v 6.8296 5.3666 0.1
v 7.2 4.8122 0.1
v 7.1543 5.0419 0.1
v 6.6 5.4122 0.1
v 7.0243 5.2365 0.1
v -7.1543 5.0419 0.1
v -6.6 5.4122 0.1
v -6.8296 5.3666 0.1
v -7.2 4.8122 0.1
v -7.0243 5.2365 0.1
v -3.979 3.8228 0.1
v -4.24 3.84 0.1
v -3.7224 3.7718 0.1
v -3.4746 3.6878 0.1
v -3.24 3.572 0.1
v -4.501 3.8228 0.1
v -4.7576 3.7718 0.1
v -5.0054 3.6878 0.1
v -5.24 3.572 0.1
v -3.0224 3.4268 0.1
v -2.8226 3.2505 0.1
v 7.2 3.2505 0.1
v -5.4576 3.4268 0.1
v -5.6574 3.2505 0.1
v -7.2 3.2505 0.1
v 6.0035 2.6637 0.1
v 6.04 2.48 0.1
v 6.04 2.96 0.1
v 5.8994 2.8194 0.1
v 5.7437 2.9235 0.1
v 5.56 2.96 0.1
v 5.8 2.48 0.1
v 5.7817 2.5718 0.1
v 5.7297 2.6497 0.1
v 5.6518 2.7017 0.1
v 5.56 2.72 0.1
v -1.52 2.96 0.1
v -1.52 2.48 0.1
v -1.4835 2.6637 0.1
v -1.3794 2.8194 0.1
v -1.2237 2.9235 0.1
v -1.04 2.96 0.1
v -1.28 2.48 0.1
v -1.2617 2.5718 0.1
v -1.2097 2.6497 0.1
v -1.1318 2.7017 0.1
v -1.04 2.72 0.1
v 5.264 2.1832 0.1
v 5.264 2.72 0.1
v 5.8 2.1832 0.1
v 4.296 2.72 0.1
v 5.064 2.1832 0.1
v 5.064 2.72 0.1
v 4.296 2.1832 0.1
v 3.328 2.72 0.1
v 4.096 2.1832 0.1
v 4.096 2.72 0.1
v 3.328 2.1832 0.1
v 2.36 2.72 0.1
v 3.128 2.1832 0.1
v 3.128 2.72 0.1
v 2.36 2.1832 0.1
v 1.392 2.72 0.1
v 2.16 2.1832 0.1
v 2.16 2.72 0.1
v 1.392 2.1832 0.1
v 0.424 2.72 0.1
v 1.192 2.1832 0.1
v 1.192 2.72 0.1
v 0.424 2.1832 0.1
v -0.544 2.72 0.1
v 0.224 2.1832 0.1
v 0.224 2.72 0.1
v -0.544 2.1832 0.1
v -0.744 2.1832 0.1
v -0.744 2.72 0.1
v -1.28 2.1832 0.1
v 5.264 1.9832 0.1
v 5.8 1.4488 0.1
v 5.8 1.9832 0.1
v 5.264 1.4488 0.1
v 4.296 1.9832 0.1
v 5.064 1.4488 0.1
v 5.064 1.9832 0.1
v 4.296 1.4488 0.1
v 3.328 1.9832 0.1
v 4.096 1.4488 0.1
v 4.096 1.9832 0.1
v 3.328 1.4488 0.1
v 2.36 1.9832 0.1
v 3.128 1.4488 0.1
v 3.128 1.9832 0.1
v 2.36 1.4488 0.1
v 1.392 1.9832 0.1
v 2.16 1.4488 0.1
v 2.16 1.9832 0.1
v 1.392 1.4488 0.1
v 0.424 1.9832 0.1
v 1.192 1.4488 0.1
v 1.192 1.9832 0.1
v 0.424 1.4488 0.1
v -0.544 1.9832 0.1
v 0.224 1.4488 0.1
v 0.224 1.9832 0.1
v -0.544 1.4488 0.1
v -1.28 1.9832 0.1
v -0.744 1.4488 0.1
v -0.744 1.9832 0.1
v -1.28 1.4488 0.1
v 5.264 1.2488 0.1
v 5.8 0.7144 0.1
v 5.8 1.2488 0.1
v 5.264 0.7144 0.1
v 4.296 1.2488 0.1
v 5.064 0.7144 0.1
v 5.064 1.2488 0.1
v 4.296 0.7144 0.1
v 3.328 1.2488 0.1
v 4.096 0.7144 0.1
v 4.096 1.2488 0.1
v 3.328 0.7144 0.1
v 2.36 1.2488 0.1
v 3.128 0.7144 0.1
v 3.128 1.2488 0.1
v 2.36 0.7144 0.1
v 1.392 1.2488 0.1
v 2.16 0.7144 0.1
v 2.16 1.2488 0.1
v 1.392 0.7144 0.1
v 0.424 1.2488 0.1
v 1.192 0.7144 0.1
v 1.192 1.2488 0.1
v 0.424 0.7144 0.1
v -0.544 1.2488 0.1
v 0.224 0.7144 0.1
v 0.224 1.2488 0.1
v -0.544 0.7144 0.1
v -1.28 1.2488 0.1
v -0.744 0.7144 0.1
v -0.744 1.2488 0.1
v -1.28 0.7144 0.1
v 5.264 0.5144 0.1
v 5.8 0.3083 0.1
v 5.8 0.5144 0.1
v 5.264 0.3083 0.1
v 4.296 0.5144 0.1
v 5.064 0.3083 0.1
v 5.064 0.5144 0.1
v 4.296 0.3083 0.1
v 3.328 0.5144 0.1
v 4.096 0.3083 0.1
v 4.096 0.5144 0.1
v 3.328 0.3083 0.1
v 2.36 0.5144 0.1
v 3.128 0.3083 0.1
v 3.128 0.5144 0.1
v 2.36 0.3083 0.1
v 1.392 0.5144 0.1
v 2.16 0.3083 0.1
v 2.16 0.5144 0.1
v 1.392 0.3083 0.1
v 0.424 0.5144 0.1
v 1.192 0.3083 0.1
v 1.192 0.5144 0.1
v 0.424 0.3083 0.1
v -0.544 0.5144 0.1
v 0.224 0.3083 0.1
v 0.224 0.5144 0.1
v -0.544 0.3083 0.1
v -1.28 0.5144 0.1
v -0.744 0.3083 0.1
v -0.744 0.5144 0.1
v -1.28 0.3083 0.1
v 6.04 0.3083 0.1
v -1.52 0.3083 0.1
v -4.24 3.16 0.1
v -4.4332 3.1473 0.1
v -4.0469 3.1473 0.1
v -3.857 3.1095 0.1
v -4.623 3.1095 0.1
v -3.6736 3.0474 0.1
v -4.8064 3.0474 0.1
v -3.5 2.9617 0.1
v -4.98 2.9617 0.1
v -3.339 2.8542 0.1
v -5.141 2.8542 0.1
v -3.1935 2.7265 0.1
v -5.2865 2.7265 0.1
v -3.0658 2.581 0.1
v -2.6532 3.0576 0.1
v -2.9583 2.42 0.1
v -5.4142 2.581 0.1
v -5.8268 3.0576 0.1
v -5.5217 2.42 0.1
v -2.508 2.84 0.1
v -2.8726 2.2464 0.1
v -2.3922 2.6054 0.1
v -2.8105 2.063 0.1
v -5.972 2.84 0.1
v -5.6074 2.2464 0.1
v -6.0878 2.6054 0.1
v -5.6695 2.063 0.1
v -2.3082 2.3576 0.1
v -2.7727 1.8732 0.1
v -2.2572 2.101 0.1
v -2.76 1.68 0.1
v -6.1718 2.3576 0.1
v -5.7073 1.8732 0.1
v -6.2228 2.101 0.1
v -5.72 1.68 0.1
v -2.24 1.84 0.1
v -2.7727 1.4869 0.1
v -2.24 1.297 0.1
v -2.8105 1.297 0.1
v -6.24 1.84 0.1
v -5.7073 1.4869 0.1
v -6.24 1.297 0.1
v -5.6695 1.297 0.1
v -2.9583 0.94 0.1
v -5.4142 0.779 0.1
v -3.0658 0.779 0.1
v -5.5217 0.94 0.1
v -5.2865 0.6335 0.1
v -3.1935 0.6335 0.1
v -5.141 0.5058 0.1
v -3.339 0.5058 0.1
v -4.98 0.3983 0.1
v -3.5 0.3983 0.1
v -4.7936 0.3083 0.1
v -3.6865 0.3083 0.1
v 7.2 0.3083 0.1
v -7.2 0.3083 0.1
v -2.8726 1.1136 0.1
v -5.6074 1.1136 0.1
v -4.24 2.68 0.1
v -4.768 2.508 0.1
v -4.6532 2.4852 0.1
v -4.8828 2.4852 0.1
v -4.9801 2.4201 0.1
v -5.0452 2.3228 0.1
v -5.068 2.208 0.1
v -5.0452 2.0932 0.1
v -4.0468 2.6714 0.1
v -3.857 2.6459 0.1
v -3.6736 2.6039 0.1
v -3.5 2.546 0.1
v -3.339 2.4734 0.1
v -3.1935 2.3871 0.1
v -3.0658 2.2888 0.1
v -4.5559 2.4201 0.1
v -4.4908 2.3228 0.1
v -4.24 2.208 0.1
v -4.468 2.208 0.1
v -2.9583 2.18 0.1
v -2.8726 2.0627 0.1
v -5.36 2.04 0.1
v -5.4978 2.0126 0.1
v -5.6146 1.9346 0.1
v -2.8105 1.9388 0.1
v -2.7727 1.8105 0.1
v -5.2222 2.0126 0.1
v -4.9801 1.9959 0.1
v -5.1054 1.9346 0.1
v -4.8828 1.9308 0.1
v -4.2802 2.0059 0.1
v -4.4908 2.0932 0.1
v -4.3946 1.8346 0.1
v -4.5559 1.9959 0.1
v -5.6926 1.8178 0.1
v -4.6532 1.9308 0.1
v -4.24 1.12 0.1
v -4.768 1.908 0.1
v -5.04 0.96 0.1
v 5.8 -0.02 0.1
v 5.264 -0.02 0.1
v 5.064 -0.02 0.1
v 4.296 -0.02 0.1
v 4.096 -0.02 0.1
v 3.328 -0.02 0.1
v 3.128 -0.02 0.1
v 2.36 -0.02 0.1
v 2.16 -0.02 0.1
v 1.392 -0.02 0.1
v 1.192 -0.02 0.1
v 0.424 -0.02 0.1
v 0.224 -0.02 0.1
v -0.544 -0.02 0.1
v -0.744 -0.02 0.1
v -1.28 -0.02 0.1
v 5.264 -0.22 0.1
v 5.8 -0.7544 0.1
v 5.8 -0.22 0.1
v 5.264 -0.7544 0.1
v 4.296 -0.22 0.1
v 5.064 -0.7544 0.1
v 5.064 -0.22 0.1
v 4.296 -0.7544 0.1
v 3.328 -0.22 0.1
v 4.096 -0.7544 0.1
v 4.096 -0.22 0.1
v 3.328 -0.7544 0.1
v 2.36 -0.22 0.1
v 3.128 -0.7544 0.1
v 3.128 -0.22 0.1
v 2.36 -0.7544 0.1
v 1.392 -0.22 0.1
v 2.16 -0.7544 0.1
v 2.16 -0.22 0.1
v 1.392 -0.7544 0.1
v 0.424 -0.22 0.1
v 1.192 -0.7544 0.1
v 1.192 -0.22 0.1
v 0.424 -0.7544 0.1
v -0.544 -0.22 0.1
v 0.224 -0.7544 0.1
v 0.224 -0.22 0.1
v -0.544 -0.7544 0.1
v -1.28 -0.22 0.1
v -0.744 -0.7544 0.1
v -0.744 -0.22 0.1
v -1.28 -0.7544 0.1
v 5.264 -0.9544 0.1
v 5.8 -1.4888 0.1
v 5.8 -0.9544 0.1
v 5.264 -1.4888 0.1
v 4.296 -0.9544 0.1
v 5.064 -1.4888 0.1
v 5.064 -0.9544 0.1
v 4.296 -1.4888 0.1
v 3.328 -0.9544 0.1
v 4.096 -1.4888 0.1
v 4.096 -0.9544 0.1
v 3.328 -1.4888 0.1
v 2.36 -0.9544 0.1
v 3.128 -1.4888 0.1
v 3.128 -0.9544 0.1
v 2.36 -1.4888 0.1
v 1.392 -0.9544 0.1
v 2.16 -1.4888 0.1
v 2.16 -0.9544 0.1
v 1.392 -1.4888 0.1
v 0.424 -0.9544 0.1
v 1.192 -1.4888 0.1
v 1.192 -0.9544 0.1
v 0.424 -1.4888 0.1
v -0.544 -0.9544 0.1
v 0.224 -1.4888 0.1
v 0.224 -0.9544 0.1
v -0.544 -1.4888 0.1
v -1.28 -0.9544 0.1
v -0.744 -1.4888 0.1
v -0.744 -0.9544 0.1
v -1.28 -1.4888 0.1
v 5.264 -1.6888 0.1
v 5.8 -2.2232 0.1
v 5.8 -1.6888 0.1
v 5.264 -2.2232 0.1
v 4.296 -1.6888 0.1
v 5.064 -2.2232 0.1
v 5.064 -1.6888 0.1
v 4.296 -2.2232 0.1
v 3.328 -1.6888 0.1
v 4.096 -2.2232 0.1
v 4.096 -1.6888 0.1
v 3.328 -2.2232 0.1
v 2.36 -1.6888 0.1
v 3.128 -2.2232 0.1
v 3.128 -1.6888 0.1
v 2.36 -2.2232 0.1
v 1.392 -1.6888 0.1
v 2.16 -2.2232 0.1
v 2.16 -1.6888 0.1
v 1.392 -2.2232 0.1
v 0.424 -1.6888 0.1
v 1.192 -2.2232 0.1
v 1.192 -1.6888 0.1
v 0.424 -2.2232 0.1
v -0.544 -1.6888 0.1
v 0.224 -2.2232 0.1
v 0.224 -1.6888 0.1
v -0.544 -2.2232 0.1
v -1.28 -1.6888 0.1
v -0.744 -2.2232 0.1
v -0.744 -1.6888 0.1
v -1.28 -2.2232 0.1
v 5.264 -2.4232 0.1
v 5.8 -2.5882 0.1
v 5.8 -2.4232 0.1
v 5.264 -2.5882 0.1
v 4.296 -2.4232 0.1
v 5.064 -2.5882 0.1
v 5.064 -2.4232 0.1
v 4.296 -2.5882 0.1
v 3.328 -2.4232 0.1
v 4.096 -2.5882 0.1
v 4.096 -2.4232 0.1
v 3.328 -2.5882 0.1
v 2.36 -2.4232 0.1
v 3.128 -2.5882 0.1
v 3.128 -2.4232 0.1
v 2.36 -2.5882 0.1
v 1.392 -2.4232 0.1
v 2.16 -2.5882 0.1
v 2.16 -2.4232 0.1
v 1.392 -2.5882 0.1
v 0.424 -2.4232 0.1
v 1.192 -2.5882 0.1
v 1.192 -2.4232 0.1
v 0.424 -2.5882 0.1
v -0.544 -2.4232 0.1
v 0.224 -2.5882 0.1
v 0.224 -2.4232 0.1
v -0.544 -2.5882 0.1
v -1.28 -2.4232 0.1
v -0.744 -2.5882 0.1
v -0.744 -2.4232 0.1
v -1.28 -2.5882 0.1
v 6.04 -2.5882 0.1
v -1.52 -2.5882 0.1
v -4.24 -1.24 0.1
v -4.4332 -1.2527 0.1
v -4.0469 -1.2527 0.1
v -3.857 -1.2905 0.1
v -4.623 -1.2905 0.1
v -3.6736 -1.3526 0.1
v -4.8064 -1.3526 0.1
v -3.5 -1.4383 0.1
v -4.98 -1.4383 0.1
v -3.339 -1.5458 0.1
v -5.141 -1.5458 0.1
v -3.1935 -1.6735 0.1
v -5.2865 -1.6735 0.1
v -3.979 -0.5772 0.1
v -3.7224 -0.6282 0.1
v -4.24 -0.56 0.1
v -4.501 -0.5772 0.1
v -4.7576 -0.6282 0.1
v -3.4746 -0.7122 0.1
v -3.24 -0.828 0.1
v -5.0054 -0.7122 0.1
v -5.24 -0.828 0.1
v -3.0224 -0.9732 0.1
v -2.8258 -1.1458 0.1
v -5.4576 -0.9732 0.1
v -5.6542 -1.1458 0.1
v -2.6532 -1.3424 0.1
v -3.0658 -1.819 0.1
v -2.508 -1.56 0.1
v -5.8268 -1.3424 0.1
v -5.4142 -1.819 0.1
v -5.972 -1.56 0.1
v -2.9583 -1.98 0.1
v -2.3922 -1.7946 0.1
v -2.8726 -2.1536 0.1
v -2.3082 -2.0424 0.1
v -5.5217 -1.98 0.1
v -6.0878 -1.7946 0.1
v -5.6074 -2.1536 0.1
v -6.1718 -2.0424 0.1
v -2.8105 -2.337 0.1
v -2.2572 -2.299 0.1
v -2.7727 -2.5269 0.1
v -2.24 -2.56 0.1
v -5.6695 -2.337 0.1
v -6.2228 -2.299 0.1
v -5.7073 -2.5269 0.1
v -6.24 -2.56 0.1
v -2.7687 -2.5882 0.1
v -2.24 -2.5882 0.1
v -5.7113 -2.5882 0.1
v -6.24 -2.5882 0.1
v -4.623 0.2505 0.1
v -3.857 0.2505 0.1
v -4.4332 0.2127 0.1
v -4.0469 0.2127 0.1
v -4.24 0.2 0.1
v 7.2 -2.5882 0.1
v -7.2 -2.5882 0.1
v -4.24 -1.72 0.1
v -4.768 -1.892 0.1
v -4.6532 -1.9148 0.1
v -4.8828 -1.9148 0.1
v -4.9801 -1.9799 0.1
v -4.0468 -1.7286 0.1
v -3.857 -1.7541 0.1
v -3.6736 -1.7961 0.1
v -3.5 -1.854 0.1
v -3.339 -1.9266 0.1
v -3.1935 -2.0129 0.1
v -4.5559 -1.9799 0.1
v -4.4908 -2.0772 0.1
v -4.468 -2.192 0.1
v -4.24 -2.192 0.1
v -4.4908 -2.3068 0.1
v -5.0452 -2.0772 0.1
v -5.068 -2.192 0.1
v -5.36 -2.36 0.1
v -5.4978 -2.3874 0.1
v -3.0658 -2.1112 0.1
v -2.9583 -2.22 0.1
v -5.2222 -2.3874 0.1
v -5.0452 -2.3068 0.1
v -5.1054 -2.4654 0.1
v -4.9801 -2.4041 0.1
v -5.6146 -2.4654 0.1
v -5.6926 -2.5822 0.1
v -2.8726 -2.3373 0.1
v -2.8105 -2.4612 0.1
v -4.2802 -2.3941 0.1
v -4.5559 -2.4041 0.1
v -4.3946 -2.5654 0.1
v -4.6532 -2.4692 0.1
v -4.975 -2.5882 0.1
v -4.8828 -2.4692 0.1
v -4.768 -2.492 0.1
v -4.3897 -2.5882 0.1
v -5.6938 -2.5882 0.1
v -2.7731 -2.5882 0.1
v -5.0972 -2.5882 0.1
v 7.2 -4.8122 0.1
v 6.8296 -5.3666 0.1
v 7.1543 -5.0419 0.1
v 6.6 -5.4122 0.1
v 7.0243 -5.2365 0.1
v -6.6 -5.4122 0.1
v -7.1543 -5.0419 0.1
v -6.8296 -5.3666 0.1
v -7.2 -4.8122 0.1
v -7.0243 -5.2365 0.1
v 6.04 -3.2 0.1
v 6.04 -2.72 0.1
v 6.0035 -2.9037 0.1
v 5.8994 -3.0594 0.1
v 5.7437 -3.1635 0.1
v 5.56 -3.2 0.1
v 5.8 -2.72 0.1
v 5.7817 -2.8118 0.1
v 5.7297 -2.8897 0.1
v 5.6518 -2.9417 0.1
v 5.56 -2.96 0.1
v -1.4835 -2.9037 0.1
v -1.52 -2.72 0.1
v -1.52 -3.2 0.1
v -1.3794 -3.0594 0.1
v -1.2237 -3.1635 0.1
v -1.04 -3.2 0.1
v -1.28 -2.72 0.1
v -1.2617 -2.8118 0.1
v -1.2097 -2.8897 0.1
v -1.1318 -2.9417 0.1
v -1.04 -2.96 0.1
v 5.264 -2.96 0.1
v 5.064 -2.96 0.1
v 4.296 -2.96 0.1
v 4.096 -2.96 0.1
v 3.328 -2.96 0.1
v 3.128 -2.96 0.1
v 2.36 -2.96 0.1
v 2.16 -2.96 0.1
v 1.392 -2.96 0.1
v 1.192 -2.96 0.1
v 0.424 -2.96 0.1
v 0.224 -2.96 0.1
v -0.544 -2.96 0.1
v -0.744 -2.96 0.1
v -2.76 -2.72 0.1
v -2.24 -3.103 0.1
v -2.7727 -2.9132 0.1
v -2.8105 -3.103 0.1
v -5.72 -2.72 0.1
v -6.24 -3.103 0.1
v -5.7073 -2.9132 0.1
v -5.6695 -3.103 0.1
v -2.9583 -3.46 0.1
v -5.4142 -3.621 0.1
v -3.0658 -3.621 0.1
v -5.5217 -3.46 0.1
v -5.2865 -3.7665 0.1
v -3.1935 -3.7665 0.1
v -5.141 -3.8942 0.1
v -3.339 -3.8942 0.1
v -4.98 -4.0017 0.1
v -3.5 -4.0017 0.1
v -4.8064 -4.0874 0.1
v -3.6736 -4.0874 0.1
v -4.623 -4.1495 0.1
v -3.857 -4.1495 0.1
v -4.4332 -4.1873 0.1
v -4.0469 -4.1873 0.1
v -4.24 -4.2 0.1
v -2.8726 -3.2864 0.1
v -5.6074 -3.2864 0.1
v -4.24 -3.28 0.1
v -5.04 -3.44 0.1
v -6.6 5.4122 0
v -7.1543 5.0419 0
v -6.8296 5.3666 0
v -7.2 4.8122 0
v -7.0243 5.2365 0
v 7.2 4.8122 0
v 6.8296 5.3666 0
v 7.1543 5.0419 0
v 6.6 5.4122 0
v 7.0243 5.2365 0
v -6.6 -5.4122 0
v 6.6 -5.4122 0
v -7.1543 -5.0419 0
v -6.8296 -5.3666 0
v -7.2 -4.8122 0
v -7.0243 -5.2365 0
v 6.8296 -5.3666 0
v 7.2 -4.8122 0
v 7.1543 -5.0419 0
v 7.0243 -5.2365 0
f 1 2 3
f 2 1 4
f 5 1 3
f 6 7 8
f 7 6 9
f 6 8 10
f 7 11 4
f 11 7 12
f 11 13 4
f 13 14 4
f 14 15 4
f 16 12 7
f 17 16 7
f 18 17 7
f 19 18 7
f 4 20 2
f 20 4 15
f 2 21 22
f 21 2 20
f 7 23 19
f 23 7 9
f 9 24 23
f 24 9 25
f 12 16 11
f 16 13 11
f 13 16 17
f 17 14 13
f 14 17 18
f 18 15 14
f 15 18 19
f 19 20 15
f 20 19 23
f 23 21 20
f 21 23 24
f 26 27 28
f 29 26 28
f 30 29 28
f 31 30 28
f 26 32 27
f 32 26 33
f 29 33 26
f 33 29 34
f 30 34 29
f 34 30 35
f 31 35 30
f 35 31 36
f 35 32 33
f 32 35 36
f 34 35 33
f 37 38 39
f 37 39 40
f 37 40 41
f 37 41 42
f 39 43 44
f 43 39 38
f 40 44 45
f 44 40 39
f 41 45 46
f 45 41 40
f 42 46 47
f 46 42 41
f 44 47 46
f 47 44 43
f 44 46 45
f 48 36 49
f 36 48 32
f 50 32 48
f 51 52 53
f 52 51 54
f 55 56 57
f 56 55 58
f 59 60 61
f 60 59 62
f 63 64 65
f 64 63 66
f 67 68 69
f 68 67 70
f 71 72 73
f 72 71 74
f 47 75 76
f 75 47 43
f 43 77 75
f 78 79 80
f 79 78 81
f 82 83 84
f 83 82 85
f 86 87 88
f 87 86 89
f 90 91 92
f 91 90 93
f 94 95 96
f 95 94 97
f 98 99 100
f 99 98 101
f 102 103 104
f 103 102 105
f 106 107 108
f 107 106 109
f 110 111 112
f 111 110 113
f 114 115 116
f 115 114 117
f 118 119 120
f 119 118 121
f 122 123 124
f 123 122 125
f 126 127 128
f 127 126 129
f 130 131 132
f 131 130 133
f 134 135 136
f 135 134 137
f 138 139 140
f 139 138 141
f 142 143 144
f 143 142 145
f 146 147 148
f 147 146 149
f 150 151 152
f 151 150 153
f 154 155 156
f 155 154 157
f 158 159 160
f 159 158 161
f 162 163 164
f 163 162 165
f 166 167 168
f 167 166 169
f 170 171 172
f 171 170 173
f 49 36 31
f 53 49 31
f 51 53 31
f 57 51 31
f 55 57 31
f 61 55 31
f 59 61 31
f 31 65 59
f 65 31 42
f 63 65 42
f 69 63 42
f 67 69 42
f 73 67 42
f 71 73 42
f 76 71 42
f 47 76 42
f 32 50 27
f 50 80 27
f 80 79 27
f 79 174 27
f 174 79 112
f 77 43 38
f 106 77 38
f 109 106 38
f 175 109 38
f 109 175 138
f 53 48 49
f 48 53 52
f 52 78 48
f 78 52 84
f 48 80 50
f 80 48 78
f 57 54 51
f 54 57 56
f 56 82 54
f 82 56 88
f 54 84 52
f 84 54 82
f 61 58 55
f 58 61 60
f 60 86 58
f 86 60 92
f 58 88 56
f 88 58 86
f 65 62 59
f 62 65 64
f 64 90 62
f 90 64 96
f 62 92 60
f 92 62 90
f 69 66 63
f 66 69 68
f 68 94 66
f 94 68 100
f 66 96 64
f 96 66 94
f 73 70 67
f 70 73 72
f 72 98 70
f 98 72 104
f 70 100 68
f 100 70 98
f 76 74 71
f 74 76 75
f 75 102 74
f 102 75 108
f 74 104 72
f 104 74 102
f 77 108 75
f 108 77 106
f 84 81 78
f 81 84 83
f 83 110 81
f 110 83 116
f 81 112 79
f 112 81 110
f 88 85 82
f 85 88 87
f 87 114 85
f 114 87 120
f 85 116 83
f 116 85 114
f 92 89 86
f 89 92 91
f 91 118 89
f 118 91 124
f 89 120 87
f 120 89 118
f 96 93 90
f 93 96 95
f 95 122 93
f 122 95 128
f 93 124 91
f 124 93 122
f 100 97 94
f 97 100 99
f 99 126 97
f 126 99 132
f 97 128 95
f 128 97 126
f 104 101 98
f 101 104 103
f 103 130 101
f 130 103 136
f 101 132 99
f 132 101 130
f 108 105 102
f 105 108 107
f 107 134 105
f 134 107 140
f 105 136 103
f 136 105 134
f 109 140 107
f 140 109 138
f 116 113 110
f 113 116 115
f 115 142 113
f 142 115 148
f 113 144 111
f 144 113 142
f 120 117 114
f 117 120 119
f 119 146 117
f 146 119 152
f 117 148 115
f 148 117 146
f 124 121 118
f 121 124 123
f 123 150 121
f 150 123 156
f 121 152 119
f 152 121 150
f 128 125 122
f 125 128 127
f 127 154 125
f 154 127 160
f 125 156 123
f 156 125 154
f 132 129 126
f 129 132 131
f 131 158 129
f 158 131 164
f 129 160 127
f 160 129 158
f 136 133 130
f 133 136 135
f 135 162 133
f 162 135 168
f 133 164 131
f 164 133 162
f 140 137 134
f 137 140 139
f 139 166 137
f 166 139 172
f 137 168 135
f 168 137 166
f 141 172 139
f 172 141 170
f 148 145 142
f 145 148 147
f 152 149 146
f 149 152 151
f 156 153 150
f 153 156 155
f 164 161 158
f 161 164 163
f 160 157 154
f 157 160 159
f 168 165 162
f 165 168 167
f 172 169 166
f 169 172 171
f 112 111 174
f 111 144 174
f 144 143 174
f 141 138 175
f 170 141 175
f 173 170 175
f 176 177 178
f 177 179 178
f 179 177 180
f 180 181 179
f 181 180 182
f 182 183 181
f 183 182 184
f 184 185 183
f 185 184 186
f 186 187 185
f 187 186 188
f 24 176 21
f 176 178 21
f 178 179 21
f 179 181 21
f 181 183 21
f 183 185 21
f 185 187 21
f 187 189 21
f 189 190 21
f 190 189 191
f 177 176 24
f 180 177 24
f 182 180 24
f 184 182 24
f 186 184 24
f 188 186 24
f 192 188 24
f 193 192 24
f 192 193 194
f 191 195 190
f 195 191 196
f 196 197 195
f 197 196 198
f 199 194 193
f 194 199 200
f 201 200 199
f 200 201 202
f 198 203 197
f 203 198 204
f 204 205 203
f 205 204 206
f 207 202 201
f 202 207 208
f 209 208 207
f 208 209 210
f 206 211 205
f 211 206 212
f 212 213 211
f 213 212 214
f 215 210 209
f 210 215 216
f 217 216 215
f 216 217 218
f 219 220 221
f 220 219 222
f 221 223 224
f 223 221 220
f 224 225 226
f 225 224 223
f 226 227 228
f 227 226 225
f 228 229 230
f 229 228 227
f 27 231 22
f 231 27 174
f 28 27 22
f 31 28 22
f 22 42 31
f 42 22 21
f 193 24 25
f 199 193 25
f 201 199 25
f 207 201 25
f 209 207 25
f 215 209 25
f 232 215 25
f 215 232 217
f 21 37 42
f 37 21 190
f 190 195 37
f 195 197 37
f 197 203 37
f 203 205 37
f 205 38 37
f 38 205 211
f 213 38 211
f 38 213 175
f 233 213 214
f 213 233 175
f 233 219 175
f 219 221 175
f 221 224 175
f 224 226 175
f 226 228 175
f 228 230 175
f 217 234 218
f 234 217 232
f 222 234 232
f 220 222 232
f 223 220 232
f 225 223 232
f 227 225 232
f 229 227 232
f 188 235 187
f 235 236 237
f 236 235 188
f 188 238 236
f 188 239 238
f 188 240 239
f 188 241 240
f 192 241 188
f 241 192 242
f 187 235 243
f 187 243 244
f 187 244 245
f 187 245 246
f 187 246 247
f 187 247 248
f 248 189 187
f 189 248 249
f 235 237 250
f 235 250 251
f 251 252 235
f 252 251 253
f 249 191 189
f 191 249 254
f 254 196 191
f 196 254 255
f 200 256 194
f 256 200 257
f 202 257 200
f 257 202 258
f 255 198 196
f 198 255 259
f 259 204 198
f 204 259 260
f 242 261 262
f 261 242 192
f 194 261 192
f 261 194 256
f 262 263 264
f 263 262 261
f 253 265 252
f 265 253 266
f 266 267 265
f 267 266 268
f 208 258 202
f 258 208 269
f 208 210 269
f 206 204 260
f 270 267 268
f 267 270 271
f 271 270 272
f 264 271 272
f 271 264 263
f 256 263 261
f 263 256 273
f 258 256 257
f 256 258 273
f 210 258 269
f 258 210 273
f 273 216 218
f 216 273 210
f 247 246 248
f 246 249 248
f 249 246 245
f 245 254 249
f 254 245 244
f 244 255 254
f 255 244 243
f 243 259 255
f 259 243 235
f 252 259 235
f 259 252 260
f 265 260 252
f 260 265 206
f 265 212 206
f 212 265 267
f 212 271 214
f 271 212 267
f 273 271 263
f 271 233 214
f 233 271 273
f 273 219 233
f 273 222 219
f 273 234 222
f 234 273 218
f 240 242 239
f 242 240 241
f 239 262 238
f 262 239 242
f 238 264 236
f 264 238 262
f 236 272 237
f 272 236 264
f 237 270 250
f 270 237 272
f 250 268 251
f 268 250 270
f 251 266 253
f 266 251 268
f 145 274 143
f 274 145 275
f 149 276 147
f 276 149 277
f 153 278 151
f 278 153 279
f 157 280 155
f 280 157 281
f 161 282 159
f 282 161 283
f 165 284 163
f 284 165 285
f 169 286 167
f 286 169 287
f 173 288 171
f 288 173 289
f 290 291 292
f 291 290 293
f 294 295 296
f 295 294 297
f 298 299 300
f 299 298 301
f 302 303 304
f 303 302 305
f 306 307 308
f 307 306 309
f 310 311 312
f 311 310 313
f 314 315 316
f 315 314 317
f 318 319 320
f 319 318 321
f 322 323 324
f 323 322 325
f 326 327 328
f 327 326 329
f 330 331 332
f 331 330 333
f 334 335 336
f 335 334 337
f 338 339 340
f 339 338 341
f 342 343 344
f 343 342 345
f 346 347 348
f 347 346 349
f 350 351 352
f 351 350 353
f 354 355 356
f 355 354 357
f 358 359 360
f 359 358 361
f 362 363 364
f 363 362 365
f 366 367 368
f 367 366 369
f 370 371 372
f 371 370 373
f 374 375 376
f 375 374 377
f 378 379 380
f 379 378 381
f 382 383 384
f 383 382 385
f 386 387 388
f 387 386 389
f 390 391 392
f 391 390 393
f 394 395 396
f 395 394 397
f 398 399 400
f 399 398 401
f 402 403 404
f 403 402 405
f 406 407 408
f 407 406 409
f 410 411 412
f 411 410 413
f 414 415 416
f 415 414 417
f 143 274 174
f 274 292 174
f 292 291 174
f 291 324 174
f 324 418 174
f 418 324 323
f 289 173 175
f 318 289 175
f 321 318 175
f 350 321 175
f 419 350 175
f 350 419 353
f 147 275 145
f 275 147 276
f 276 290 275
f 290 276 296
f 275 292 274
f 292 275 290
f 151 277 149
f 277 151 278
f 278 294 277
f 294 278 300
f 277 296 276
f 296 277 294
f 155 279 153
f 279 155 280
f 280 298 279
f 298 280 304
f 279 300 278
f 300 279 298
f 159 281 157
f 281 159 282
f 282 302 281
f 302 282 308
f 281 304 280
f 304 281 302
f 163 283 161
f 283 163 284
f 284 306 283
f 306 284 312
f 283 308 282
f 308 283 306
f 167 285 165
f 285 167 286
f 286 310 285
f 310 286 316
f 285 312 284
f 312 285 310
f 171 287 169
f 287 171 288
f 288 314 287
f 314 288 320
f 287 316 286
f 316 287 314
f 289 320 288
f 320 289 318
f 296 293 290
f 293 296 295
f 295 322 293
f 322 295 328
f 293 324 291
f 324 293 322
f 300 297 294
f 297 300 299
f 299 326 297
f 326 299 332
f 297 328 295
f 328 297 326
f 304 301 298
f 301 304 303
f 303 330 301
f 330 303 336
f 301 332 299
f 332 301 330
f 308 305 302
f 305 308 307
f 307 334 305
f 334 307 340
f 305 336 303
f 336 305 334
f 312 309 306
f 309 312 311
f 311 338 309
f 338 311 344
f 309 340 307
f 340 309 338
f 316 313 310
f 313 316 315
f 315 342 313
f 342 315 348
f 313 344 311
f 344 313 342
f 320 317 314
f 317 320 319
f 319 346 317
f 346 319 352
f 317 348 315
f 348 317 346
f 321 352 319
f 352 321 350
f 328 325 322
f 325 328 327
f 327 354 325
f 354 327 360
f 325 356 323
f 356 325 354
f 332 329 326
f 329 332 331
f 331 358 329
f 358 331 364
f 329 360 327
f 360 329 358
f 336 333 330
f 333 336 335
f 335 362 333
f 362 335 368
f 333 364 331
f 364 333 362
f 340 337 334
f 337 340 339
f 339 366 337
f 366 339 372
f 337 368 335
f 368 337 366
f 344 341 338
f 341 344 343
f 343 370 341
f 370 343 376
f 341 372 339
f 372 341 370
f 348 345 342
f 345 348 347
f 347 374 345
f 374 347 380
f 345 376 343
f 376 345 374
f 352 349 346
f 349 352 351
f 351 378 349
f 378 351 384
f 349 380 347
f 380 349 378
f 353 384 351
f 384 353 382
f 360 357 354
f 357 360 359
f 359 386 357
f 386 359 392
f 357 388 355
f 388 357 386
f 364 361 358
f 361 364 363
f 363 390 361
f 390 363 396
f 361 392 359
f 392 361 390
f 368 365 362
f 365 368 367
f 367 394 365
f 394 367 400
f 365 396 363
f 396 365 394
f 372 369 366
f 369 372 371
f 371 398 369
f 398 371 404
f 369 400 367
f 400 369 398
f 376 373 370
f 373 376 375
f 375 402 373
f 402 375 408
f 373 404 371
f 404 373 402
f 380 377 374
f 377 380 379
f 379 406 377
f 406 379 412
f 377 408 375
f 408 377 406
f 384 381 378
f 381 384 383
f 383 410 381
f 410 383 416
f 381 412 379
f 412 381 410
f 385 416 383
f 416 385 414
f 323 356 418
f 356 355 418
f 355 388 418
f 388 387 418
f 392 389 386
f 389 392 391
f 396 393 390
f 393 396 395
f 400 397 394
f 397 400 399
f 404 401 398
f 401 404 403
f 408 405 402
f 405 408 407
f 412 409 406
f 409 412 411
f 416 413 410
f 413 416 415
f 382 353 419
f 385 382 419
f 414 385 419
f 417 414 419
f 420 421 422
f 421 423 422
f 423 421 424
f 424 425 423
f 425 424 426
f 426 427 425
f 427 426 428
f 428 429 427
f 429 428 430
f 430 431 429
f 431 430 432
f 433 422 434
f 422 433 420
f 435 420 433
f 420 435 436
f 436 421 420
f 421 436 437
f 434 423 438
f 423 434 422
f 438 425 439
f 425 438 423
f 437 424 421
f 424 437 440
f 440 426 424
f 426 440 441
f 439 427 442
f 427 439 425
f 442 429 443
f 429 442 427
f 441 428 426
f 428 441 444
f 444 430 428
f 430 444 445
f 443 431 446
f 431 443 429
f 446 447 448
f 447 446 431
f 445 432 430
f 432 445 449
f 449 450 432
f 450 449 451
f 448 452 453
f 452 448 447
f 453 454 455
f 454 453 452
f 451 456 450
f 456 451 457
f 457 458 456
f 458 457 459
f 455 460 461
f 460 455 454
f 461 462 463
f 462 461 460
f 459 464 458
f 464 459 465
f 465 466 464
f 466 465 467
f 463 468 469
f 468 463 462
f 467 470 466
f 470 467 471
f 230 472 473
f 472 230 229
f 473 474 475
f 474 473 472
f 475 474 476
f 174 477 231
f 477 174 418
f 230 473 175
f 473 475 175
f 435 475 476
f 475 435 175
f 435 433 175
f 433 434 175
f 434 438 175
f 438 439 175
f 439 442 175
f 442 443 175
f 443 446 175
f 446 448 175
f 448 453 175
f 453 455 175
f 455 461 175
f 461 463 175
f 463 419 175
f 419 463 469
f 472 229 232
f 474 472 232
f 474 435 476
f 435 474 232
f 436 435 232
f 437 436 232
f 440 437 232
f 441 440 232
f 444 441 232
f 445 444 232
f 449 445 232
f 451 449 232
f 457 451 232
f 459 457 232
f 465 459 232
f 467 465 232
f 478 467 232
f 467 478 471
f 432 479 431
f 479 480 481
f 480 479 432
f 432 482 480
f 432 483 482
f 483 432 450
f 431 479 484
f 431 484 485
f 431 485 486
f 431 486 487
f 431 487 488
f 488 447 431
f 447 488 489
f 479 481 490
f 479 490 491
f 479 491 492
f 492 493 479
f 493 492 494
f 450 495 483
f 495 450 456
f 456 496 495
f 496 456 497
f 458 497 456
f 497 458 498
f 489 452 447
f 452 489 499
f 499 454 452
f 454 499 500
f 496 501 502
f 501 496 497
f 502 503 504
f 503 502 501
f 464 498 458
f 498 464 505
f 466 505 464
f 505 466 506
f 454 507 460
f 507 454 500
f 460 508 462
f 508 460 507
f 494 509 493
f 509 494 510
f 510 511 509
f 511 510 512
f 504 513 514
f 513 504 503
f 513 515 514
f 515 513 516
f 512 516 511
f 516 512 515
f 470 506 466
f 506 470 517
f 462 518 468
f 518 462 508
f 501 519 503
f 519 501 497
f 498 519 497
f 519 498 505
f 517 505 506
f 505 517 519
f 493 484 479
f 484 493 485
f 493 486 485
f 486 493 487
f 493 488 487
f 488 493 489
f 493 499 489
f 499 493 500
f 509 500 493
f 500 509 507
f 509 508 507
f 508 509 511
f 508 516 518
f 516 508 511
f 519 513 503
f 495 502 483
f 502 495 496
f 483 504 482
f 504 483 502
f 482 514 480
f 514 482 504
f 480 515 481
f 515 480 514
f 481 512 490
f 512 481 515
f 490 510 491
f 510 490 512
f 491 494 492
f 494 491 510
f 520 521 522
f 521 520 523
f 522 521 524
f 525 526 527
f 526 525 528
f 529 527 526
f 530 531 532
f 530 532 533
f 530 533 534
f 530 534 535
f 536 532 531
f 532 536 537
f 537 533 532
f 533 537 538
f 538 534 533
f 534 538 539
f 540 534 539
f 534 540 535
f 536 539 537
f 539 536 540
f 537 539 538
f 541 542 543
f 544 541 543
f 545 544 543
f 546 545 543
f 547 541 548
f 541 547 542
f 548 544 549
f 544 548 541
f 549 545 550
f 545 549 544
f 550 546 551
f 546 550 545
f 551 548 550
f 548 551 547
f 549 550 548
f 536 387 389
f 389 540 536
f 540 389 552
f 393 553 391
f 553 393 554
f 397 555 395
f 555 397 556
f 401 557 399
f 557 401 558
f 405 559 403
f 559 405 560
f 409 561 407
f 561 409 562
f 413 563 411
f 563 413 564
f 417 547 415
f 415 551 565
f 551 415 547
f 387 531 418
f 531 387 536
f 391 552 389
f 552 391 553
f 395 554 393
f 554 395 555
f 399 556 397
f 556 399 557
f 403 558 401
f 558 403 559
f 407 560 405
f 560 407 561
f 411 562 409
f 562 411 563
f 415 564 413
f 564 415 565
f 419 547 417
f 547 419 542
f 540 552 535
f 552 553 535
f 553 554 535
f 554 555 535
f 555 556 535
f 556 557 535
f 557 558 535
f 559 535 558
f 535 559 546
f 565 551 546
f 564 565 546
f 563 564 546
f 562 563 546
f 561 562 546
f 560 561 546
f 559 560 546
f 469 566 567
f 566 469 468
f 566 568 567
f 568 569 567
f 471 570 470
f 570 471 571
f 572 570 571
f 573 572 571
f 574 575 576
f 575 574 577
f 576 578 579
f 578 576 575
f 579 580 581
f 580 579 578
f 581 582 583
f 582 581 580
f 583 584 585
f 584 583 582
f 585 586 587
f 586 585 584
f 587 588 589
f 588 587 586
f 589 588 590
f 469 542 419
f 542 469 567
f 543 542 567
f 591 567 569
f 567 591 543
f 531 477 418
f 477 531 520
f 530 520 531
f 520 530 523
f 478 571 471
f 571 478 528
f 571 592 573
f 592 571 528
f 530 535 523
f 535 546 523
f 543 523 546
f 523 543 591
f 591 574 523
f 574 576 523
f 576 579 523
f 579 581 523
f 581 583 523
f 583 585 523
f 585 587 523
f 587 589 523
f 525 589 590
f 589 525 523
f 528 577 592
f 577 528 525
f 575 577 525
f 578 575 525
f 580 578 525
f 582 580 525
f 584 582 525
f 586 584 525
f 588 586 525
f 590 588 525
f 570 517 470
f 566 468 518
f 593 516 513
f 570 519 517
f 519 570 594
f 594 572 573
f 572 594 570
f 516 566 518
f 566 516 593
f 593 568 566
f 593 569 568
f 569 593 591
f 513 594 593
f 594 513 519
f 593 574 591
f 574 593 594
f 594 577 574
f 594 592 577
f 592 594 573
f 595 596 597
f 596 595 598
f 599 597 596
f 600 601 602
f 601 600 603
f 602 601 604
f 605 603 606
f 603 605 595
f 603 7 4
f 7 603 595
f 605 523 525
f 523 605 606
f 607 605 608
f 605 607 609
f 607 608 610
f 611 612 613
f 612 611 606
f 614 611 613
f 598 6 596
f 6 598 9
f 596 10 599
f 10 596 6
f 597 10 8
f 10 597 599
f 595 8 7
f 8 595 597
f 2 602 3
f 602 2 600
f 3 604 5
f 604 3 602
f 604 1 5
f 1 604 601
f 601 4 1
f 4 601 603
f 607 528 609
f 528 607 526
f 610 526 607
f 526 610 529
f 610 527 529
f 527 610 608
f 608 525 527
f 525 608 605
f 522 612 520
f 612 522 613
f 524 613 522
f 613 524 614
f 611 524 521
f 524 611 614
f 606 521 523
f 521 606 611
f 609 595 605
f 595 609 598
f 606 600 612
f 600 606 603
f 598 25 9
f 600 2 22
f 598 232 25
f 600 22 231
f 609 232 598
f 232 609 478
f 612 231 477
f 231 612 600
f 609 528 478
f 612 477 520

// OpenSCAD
use <../lib.scad>
use <s/6177969ds01.scad>
use <s/6177969ds05.scad>
use <s/6177969fs01.scad>
use <s/6177969fs02.scad>
use <s/6177969fs03.scad>
function ldraw_lib__6177969f() = [
// 0 Sticker  1.4 x  1.8 with Grey Air Vent and Red Taillamp on Black Background Left
// 0 Name: 6177969f.dat
// 0 Author: Massimo Maso [Sirio]
// 0 !LDRAW_ORG Part UPDATE 2024-08
// 0 !LICENSE Licensed under CC BY 4.0 : see CAreadme.txt
// 
// 0 BFC CERTIFY CCW
  [0,"BFC","CERTIFY"],
  [0,"BFC","CCW"],
// 
// 0 !KEYWORDS 1966, Bricklink 75881stk01, Brickowl 507382, Ford, GT40
// 0 !KEYWORDS Rebrickable 30897, Set 75881, Speed Champions
// 
// 0 !HISTORY 2024-09-30 [OrionP] Official Update 2024-08
// 
// 
// 1 16 0 0 8.1384 -1 0 0 0 1 0 0 0 1 s\6177969ds01.dat
  [1,16,0,0,8.1384,-1,0,0,0,1,0,0,0,1, ldraw_lib__s__6177969ds01()],
// 1 16 0 0 8.1142 1 0 0 0 1 0 0 0 1 s\6177969fs01.dat
  [1,16,0,0,8.1142,1,0,0,0,1,0,0,0,1, ldraw_lib__s__6177969fs01()],
// 1 16 0 0 -6.4577 1 0 0 0 1 0 0 0 1 s\6177969fs02.dat
  [1,16,0,0,-6.4577,1,0,0,0,1,0,0,0,1, ldraw_lib__s__6177969fs02()],
// 1 16 0 0 -6.4833 1 0 0 0 1 0 0 0 1 s\6177969fs03.dat
  [1,16,0,0,-6.4833,1,0,0,0,1,0,0,0,1, ldraw_lib__s__6177969fs03()],
// 1 16 0 0 0 1 0 0 0 1 0 0 0 1 s\6177969ds05.dat
  [1,16,0,0,0,1,0,0,0,1,0,0,0,1, ldraw_lib__s__6177969ds05()],
];
module ldraw_lib__6177969f(step=0, col=false, unit=2/5, alt=false, line=0.2, solid=!$preview)
    makepoly(ldraw_lib__6177969f(), step=step, col=col, unit=unit, alt=alt, line=line, solid=solid);
ldraw_lib__6177969f(line=0.2);
